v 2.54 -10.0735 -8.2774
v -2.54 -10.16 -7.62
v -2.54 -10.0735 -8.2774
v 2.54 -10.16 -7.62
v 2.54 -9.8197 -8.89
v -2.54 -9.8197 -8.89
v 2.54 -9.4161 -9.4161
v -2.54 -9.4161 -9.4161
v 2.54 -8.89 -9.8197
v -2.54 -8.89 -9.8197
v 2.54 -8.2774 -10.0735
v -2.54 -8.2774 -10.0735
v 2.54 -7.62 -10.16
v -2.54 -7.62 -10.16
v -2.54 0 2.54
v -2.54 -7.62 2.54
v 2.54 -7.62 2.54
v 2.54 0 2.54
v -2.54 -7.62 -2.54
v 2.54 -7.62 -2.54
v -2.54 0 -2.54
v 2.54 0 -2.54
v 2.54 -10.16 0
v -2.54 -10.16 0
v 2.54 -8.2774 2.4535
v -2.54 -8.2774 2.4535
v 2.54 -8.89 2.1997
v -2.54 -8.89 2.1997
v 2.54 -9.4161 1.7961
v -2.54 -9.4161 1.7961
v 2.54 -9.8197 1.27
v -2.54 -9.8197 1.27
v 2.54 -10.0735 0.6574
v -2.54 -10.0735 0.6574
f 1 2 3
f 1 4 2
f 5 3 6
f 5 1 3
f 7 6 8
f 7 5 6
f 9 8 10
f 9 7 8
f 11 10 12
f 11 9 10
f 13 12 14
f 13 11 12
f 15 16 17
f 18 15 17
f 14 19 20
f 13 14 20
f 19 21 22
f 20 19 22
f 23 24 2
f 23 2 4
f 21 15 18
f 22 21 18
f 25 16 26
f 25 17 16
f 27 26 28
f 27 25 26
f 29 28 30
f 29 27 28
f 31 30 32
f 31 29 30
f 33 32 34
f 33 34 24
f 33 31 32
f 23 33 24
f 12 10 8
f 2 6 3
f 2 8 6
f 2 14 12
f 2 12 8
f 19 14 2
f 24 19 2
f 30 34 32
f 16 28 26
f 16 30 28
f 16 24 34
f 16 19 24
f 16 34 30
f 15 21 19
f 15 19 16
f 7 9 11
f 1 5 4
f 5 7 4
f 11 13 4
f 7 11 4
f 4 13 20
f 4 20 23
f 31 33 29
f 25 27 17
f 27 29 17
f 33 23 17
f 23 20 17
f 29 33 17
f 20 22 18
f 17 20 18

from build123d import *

# Parameters (mm, degrees)
F0_W     = 5.08
F0_H     = 5.08
F1_DEPTH = 7.62
F2_W     = 5.08
F2_H     = 12.7
F3_DEPTH = 2.54
F4_R     = 2.53999


# Not quite as in the source:
# - a fillet or chamfer is up to 0.001 mm smaller than in the source, because OpenCascade refuses the exact size


with BuildPart() as f1:
    # F0 (on Front) → F1 (new body)
    with BuildSketch(Plane.XZ):
        Rectangle(F0_W, F0_H)
    extrude(amount=F1_DEPTH)

    # F2 (on face) → F3 (join)
    with BuildSketch(Plane.XZ.offset(7.62)):
        with Locations((0, -3.81)):
            Rectangle(F2_W, F2_H)
    extrude(amount=F3_DEPTH)

    # F4 (radius 2.54 in the source; OpenCascade refuses exactly that, so slightly less here)
    f4_edges = [f1.edges().sort_by_distance(p)[0] for p in [
        (0, -10.16, 2.54),
        (0, -10.16, -10.16),
    ]]
    fillet(f4_edges, radius=F4_R)


solid = f1.part
